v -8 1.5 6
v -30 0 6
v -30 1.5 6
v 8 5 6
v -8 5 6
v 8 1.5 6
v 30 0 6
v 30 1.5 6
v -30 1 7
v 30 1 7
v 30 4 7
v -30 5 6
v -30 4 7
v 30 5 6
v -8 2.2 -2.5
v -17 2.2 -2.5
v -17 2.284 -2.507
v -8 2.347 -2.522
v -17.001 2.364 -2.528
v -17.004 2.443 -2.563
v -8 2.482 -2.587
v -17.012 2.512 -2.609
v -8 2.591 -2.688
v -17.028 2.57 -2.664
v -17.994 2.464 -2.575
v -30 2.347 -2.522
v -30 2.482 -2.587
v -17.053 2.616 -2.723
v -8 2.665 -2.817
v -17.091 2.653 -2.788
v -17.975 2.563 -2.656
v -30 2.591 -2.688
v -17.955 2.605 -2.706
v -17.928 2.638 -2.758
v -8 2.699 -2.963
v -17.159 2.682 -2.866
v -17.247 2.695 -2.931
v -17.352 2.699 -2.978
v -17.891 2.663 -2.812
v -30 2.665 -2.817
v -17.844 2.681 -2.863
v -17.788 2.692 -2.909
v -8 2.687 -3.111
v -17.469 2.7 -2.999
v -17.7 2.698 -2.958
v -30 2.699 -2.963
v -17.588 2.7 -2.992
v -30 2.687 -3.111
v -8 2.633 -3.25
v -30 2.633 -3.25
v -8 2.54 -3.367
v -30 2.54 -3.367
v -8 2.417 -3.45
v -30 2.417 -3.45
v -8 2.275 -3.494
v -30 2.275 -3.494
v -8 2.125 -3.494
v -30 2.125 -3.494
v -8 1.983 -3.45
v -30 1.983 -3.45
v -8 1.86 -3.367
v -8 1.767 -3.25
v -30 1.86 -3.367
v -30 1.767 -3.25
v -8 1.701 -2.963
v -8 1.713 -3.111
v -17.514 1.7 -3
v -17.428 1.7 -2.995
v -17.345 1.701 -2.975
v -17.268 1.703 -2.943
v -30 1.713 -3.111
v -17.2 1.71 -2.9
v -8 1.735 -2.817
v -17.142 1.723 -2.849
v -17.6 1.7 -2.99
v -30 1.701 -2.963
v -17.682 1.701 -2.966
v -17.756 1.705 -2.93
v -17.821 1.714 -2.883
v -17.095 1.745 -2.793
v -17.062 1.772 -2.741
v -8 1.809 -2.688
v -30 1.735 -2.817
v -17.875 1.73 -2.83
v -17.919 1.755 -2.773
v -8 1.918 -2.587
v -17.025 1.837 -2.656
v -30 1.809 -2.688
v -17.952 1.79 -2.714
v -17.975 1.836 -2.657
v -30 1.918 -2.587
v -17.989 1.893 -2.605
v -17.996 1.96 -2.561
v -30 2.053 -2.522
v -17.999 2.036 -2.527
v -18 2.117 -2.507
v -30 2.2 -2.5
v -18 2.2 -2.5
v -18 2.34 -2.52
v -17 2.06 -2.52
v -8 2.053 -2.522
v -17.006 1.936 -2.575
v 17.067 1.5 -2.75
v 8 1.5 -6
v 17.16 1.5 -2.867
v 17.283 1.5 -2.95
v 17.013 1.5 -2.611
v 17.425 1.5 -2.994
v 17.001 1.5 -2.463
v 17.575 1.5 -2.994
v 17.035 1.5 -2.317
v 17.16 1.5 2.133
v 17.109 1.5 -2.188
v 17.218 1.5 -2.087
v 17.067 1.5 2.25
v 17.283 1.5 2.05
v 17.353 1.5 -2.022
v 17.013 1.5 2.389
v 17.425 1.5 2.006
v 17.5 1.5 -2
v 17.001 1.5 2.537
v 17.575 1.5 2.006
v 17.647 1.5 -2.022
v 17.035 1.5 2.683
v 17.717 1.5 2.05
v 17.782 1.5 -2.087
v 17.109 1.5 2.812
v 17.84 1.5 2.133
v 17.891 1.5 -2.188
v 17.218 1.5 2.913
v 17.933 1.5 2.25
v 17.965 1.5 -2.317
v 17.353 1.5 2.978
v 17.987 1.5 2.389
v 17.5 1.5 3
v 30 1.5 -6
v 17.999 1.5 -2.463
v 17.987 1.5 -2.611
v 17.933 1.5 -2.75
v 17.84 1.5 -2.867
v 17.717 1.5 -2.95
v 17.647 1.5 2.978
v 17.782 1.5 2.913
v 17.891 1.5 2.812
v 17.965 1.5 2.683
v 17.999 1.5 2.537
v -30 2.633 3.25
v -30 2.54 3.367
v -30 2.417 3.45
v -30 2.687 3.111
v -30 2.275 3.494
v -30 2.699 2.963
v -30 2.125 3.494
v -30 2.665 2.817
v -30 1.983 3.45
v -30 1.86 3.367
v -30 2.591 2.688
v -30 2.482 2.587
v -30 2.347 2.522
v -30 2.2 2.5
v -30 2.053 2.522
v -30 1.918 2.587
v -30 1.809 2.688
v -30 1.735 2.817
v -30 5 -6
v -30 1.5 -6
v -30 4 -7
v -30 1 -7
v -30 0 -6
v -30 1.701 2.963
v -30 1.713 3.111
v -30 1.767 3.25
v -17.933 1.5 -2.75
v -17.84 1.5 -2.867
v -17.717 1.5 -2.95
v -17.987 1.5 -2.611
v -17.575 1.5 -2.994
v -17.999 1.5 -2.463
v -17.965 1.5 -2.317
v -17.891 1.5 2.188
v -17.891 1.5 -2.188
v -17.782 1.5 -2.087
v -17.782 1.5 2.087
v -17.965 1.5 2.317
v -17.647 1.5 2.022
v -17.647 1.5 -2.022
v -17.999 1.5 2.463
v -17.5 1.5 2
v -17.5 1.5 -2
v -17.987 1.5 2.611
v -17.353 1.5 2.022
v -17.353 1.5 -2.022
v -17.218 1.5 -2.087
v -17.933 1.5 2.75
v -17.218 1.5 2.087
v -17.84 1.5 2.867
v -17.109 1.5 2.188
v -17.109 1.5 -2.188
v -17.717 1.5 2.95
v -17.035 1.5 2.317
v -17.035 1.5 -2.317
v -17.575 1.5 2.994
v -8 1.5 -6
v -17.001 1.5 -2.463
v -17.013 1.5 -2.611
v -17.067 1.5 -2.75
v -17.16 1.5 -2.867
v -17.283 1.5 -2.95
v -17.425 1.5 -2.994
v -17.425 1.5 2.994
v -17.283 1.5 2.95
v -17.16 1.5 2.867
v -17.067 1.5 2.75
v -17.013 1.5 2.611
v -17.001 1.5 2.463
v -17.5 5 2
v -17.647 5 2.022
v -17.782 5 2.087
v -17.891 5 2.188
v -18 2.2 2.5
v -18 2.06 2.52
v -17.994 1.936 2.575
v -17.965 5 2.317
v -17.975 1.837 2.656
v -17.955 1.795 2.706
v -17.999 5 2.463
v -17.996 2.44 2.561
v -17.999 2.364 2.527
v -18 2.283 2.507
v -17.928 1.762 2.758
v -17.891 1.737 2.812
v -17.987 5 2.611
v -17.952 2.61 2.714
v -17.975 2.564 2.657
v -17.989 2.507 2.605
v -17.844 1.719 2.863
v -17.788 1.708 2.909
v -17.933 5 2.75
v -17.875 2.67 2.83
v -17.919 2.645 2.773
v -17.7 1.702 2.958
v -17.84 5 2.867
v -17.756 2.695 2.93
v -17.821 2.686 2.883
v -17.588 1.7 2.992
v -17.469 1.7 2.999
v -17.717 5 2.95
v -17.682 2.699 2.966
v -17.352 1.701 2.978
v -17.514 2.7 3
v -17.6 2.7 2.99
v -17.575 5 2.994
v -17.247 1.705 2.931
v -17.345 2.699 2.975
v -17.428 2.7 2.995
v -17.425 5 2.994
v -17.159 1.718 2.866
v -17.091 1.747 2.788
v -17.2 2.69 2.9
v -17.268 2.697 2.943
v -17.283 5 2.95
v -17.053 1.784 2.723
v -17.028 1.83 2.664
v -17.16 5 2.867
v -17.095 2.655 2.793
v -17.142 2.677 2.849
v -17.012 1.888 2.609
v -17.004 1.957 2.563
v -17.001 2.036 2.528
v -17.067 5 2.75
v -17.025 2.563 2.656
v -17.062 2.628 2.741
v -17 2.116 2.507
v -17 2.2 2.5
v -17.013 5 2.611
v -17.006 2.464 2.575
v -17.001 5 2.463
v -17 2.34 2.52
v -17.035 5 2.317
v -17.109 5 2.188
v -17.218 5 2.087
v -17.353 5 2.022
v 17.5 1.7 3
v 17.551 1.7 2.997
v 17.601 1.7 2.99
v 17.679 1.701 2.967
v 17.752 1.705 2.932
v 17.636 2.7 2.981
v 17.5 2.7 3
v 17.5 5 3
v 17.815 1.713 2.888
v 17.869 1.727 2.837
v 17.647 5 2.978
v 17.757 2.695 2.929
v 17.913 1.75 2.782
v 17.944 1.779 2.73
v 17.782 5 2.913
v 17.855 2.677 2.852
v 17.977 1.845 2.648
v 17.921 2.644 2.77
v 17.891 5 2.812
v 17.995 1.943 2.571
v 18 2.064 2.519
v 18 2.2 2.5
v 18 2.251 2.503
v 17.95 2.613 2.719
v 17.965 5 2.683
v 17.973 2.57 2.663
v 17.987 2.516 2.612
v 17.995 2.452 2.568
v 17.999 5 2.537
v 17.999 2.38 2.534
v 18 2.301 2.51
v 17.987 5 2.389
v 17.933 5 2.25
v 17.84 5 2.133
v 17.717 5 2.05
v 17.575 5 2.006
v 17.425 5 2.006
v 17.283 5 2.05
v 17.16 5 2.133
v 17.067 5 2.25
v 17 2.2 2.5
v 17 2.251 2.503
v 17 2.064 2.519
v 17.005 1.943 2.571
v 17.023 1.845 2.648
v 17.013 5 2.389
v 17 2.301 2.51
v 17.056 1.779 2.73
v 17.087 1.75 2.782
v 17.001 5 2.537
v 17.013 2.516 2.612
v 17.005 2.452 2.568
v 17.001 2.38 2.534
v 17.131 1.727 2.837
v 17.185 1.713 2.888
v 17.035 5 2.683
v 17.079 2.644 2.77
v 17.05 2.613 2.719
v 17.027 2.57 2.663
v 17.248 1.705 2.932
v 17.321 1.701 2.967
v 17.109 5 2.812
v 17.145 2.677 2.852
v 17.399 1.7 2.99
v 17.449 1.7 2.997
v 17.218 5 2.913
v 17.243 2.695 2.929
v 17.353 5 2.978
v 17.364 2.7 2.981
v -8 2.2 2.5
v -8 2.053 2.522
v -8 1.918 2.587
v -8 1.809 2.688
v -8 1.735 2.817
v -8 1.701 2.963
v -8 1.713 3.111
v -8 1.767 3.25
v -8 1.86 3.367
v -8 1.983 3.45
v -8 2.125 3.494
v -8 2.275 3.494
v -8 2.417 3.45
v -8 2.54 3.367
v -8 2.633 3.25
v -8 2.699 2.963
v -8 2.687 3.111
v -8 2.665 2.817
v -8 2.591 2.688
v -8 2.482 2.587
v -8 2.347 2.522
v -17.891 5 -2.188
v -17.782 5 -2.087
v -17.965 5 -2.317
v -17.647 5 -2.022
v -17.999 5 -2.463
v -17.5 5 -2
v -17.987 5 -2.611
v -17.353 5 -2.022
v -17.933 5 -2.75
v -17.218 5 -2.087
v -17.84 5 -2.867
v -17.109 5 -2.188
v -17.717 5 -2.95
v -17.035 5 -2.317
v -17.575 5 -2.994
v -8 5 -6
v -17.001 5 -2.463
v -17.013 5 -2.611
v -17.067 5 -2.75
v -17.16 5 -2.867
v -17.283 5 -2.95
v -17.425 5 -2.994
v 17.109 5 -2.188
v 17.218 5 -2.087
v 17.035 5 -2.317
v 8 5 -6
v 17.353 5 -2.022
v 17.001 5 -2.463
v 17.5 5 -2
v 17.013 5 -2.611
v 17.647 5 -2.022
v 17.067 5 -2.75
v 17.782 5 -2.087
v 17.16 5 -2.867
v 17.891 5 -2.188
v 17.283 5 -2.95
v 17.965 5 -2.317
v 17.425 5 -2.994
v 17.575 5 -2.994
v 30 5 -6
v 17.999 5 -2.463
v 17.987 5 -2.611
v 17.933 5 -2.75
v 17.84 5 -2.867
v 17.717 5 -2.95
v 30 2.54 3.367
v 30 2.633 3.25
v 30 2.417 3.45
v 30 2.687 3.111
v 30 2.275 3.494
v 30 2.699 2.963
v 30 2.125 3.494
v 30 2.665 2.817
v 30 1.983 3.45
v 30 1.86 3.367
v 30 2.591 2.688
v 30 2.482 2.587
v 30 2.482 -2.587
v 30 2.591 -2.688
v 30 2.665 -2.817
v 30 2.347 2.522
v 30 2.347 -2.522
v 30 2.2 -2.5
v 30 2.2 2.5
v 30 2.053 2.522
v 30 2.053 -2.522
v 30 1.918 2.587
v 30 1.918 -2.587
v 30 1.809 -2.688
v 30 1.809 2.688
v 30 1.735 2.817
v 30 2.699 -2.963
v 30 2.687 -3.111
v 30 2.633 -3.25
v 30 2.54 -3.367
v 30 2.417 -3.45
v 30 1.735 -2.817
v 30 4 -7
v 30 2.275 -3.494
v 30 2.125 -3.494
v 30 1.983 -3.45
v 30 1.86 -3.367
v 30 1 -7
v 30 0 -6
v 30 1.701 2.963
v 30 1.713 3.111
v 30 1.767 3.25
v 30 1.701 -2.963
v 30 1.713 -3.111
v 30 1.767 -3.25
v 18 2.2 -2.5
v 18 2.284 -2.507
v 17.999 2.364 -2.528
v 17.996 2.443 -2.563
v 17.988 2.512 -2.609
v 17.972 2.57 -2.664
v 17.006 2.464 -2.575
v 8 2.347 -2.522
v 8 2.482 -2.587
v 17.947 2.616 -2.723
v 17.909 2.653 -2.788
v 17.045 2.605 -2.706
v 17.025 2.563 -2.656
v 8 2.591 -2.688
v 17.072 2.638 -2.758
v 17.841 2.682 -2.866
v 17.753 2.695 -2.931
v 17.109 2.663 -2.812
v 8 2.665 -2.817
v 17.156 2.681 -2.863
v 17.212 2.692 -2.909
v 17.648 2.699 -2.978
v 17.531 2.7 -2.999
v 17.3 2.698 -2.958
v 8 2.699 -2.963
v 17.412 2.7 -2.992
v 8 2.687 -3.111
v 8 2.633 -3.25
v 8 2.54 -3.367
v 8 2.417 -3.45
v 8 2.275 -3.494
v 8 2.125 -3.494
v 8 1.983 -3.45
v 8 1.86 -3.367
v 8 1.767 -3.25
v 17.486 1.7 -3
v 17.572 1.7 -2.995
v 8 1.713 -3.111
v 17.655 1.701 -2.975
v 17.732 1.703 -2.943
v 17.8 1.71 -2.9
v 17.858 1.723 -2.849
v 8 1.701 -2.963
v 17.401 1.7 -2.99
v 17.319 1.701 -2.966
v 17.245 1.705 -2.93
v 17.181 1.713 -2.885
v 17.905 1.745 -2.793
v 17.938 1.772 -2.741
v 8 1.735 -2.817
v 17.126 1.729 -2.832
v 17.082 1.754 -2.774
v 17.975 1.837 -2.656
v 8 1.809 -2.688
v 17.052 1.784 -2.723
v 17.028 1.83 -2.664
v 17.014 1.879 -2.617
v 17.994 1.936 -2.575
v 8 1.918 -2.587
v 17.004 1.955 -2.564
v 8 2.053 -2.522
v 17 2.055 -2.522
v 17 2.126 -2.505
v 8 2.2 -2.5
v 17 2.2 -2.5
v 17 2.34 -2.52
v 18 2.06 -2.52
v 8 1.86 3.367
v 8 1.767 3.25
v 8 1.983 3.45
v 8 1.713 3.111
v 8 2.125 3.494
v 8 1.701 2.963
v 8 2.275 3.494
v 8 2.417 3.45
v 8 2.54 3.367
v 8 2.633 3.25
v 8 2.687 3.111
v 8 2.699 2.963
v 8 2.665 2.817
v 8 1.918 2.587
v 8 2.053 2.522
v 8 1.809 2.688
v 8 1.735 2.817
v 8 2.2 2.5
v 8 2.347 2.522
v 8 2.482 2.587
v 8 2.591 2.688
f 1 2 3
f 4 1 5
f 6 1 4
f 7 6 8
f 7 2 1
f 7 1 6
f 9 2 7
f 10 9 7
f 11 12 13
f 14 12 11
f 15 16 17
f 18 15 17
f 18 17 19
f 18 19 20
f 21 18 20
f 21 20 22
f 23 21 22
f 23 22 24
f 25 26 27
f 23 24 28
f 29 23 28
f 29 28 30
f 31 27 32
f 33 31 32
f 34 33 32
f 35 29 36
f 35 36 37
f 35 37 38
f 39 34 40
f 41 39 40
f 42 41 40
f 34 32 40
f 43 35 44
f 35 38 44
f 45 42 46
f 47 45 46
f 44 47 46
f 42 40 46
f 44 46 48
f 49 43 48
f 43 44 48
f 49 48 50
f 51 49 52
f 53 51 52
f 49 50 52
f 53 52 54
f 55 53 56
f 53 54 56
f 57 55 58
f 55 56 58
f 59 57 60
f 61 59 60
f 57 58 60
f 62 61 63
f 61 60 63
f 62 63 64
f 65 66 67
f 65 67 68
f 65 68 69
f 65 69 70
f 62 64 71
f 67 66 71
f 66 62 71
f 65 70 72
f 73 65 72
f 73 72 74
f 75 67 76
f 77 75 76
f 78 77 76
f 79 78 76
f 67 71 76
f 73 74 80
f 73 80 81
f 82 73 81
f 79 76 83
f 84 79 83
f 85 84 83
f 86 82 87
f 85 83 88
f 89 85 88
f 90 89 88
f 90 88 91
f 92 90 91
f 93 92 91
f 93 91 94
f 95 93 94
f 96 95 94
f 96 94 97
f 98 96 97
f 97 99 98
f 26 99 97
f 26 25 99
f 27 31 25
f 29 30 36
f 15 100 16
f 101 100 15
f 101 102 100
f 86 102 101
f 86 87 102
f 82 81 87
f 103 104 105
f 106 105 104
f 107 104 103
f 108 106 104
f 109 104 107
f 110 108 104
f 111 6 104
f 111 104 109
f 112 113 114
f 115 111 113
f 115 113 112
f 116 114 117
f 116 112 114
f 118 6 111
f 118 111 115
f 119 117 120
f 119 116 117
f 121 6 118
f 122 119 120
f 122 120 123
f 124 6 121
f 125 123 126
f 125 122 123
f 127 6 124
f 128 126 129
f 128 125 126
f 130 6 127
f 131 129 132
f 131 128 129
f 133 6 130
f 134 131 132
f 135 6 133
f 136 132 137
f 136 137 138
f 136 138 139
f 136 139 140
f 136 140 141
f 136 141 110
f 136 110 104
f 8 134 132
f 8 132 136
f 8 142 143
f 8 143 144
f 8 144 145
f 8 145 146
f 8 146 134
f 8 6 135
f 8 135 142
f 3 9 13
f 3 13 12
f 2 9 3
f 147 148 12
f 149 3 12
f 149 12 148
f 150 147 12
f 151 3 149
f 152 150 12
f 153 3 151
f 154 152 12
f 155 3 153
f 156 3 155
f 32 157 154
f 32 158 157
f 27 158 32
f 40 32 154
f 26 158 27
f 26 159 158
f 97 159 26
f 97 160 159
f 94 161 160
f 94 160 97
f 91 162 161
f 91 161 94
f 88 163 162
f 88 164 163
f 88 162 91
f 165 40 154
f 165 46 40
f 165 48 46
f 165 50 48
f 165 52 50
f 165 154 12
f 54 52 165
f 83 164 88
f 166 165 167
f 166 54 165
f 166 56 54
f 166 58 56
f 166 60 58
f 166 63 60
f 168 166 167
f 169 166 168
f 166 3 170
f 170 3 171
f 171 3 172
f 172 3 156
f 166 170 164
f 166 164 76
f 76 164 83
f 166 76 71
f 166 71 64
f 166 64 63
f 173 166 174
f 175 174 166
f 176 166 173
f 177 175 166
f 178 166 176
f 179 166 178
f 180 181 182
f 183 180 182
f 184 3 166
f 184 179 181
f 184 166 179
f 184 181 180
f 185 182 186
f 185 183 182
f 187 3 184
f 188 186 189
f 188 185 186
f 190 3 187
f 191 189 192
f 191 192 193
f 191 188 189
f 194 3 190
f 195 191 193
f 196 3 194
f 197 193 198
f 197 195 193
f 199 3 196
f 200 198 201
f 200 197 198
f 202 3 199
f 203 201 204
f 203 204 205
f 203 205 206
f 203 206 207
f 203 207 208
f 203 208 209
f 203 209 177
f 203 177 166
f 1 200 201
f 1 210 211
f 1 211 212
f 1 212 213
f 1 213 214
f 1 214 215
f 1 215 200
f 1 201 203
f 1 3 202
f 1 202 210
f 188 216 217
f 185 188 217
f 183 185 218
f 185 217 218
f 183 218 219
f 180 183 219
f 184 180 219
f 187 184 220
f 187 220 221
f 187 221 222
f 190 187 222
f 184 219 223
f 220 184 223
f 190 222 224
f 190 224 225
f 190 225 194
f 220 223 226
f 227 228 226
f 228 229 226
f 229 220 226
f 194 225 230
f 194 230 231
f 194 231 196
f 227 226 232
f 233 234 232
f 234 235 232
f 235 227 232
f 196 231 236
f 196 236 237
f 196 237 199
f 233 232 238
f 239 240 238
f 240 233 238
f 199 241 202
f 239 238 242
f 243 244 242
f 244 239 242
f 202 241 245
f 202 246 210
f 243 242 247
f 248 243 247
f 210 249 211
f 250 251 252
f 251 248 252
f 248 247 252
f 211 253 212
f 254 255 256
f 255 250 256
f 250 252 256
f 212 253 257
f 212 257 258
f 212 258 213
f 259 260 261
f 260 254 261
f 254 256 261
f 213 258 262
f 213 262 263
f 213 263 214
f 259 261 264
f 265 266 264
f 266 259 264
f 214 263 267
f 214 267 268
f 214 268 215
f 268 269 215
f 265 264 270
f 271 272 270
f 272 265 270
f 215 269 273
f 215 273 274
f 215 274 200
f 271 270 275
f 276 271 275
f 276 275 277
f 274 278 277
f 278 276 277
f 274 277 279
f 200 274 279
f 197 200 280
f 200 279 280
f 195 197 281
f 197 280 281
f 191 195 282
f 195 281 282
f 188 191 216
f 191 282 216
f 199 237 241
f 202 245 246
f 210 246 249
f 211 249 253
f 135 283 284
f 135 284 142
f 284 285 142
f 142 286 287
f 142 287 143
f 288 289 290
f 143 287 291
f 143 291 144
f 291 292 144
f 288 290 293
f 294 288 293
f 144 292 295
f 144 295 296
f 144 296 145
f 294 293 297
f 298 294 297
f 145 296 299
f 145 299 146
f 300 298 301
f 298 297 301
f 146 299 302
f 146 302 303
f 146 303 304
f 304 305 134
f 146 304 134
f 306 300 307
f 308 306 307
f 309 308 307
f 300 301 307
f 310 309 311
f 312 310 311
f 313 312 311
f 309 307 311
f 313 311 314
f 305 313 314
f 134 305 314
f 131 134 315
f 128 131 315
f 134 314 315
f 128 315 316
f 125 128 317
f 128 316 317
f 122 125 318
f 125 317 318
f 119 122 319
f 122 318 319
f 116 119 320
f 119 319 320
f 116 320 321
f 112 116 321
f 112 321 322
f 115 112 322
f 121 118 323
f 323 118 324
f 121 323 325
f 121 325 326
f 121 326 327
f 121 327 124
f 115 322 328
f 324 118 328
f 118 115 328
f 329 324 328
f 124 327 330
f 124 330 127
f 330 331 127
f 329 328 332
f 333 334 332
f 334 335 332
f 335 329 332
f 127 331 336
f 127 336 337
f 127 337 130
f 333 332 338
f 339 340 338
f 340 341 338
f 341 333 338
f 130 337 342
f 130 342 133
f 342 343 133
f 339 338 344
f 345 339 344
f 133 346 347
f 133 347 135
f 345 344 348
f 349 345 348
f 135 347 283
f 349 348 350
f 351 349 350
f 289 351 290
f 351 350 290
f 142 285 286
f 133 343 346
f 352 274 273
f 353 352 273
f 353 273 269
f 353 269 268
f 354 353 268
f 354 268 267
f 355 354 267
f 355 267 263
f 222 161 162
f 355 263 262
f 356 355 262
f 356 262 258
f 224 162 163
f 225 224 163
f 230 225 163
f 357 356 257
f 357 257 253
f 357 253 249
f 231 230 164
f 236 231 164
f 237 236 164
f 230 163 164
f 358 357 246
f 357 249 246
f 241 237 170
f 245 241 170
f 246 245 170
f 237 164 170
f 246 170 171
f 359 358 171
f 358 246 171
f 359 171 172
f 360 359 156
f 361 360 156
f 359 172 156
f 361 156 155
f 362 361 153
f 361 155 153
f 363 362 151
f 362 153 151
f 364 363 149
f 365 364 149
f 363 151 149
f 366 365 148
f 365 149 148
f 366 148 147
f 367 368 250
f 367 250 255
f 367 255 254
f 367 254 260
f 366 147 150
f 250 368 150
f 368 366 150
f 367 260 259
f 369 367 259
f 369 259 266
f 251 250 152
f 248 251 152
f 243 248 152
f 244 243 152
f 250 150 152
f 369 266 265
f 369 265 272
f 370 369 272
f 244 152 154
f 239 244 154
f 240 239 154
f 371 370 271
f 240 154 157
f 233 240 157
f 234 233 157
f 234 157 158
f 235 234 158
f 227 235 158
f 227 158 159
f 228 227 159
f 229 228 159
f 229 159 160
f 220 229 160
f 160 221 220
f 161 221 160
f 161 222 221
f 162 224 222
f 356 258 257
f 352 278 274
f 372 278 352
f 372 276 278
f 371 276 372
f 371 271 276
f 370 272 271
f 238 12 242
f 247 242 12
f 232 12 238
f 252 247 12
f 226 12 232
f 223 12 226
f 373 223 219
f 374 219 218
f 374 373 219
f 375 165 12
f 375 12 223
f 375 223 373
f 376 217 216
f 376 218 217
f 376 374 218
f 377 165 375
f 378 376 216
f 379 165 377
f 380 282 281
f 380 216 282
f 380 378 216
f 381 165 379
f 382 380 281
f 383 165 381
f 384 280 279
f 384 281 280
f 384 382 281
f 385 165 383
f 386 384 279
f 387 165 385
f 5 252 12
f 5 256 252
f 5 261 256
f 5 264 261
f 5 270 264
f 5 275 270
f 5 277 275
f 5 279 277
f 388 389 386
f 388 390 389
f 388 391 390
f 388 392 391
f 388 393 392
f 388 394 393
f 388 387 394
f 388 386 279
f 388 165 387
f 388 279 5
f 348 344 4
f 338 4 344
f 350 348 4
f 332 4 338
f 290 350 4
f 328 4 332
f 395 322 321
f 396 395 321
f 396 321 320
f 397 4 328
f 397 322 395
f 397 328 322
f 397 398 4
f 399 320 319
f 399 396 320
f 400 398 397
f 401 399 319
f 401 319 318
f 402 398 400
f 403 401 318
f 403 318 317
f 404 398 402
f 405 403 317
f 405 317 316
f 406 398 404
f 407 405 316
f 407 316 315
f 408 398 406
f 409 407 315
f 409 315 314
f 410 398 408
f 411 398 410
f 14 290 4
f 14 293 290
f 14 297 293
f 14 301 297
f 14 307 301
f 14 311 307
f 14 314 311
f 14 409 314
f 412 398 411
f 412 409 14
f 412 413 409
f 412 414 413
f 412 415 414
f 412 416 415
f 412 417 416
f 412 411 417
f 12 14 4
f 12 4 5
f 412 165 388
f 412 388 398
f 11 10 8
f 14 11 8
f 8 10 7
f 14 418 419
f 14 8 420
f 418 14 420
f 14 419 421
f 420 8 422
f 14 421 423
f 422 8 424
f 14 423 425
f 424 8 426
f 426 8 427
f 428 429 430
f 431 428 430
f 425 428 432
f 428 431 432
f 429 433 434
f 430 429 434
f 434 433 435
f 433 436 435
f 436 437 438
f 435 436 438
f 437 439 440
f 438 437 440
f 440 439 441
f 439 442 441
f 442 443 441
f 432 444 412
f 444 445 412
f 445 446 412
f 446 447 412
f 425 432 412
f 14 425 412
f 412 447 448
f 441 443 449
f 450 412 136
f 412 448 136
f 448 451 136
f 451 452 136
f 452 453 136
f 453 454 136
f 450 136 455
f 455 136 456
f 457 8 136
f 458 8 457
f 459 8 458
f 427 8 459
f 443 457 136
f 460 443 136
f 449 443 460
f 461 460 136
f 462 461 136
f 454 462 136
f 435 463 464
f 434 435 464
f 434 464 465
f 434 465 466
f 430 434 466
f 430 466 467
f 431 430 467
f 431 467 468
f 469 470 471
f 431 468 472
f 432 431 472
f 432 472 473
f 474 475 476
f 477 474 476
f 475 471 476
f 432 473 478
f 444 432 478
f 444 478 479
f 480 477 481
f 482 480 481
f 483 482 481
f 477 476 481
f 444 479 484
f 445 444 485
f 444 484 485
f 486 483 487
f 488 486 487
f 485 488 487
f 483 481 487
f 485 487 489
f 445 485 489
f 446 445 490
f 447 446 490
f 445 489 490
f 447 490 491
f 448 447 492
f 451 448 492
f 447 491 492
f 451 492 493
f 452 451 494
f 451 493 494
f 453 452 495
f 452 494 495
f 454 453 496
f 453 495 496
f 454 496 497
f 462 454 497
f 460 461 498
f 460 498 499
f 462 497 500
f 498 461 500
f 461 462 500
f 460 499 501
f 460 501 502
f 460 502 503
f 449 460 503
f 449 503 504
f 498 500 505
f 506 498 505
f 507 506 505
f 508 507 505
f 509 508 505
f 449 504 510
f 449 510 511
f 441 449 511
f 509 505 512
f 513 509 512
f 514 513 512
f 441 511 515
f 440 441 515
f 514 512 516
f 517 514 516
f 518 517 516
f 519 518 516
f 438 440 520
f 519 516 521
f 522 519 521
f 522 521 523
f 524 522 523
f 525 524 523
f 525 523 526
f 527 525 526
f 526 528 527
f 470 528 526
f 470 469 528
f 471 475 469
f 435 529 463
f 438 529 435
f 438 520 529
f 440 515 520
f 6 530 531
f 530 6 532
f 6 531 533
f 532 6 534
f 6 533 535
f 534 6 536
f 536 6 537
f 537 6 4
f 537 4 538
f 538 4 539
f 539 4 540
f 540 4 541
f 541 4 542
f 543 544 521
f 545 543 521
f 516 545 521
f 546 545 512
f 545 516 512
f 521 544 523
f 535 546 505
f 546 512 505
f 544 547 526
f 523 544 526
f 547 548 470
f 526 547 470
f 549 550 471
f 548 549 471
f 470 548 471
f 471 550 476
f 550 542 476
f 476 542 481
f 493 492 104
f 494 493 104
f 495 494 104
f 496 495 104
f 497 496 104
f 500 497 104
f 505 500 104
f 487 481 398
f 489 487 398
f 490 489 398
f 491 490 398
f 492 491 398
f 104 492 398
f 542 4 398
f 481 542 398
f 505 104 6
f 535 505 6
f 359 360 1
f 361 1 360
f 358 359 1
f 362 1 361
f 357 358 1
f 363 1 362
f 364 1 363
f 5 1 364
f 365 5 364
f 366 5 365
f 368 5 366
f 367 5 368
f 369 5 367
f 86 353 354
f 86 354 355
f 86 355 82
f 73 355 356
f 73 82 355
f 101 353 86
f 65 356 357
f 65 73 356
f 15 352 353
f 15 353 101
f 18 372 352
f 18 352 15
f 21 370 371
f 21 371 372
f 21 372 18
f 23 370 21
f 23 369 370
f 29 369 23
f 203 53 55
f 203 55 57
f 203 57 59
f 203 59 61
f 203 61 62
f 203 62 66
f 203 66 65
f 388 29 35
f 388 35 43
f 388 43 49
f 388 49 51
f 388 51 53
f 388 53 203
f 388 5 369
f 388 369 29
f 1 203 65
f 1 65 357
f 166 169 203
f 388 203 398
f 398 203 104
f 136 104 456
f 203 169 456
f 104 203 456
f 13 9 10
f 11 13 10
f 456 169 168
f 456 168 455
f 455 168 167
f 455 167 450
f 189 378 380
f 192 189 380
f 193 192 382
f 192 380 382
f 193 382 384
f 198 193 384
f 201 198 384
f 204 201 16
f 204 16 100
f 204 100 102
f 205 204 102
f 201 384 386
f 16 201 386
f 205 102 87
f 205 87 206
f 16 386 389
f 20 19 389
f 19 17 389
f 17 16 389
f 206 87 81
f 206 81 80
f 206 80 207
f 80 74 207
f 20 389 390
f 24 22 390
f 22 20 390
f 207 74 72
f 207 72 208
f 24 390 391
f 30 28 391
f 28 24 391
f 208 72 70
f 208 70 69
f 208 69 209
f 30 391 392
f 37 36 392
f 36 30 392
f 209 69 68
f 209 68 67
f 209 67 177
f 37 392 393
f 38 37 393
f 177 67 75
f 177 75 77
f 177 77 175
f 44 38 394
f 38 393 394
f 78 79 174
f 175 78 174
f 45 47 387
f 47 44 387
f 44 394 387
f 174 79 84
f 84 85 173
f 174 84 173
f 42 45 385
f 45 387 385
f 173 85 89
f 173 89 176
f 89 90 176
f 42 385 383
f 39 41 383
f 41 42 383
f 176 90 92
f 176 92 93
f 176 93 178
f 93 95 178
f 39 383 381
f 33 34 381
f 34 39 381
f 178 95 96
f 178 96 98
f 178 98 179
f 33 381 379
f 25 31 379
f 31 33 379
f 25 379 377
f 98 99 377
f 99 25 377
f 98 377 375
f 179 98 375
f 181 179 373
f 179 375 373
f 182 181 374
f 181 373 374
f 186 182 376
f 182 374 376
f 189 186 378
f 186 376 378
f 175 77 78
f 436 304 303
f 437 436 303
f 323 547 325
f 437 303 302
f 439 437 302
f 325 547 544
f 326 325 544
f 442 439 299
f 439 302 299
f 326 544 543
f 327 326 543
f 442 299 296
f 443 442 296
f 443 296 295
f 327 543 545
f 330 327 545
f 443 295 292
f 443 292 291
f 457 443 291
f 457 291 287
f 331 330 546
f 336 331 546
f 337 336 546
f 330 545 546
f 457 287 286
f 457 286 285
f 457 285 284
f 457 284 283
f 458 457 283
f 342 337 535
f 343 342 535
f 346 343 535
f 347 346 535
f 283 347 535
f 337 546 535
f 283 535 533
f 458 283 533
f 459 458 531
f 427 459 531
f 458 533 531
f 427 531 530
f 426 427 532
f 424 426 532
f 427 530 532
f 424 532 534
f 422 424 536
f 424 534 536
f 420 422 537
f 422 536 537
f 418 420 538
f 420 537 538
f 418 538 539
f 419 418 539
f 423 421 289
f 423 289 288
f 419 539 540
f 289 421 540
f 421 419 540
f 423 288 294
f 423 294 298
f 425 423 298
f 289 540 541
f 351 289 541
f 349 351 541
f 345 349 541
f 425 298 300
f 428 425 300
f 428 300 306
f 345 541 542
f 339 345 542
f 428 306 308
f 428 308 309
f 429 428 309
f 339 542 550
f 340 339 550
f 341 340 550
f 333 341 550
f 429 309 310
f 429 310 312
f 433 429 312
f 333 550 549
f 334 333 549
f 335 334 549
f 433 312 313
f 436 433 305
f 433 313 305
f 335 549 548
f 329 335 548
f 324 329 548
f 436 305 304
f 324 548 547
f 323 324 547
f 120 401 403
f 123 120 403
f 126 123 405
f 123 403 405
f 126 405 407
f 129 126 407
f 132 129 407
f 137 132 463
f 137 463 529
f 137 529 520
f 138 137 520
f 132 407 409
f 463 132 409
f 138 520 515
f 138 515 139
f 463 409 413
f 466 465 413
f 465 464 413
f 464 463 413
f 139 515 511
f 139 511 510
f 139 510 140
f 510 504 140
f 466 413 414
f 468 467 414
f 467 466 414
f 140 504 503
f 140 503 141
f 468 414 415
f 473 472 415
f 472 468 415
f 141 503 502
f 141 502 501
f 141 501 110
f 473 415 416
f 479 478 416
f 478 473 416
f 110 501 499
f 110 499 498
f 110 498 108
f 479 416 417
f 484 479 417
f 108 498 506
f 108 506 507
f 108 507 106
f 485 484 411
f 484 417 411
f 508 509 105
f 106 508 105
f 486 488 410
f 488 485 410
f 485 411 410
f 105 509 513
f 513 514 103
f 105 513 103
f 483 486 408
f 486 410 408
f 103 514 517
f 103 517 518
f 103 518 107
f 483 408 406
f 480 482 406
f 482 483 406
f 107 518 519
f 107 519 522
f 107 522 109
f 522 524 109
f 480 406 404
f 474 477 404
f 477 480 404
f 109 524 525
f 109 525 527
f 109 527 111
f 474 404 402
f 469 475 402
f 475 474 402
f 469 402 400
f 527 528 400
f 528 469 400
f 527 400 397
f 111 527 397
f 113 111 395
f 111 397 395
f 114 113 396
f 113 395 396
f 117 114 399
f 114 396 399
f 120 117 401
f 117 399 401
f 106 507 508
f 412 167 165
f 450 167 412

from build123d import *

# Parameters (mm, degrees)
SKETCH_1_W          = 60
SKETCH_1_H          = 14
EXTRUDE_1_DEPTH     = 5
SKETCH_2_W          = 16
SKETCH_2_H          = 12
CUT_EXTRUDE_1_DEPTH = 32.208973069
SKETCH_3_R          = 0.5
CUT_EXTRUDE_2_DEPTH = 61.613529843
SKETCH_4_W          = 22
SKETCH_4_H          = 12
CUT_EXTRUDE_3_DEPTH = 1.5
CHAMFER_1_SIZE      = 1
CHAMFER_2_SIZE      = 1
CHAMFER_3_SIZE      = 1
SKETCH_5_R          = 0.5
CUT_EXTRUDE_4_DEPTH = 32.208973069


with BuildPart() as part:
    # 草图1 → 凸台-拉伸1 (new body)
    with BuildSketch(Plane(origin=(0, 0, 0), x_dir=(1, 0, 0), z_dir=(0, 1, 0))):
        Rectangle(SKETCH_1_W, SKETCH_1_H)
    extrude(amount=EXTRUDE_1_DEPTH)

    # 草图2 → 切除-拉伸1 (cut, through all)
    with BuildSketch(Plane(origin=(0, 5, 0), x_dir=(1, 0, 0), z_dir=(0, 1, 0))):
        Rectangle(SKETCH_2_W, SKETCH_2_H)
    extrude(amount=-CUT_EXTRUDE_1_DEPTH, mode=Mode.SUBTRACT)

    # 草图3 → 切除-拉伸2 (cut, through all)
    with BuildSketch(Plane.ZY.offset(30)):
        with Locations((-3, 2.2)):
            Circle(SKETCH_3_R)
        with Locations(Location((3, 2.2, 0), (0, 0, 180))):
            Circle(SKETCH_3_R)
    extrude(amount=-CUT_EXTRUDE_2_DEPTH, mode=Mode.SUBTRACT)

    # 草图4 → 切除-拉伸3 (cut)
    with BuildSketch(Plane.XZ):
        with Locations((-19, 0)):
            Rectangle(SKETCH_4_W, SKETCH_4_H)
        with Locations((19, 0)):
            Rectangle(SKETCH_4_W, SKETCH_4_H)
    extrude(amount=-CUT_EXTRUDE_3_DEPTH, mode=Mode.SUBTRACT)

    # 倒角1
    chamfer_1_edges = [part.edges().sort_by_distance(p)[0] for p in [
        (0, 5, -7),
        (0, 5, 7),
    ]]
    chamfer(chamfer_1_edges, length=CHAMFER_1_SIZE - 0.0001)  # a hair under: the kernel refuses the full size

    # 倒角2
    chamfer_2_edges = [part.edges().sort_by_distance(p)[0] for p in [
        (0, 0, 7),
    ]]
    chamfer(chamfer_2_edges, length=CHAMFER_2_SIZE - 0.0001)  # a hair under: the kernel refuses the full size

    # 倒角3
    chamfer_3_edges = [part.edges().sort_by_distance(p)[0] for p in [
        (0, 0, -7),
    ]]
    chamfer(chamfer_3_edges, length=CHAMFER_3_SIZE - 0.0001)  # a hair under: the kernel refuses the full size

    # 草图5 → 切除-拉伸4 (cut, through all)
    with BuildSketch(Plane(origin=(0, 5, 0), x_dir=(1, 0, 0), z_dir=(0, 1, 0))):
        with Locations(Location((-17.5, 2.5, 0), (0, 0, 270))):
            Circle(SKETCH_5_R)
        with Locations(Location((17.5, 2.5, 0), (0, 0, 270))):
            Circle(SKETCH_5_R)
        with Locations(Location((17.5, -2.5, 0), (0, 0, 270))):
            Circle(SKETCH_5_R)
        with Locations(Location((-17.5, -2.5, 0), (0, 0, 90))):
            Circle(SKETCH_5_R)
    extrude(amount=-CUT_EXTRUDE_4_DEPTH, mode=Mode.SUBTRACT)


solid = part.part
